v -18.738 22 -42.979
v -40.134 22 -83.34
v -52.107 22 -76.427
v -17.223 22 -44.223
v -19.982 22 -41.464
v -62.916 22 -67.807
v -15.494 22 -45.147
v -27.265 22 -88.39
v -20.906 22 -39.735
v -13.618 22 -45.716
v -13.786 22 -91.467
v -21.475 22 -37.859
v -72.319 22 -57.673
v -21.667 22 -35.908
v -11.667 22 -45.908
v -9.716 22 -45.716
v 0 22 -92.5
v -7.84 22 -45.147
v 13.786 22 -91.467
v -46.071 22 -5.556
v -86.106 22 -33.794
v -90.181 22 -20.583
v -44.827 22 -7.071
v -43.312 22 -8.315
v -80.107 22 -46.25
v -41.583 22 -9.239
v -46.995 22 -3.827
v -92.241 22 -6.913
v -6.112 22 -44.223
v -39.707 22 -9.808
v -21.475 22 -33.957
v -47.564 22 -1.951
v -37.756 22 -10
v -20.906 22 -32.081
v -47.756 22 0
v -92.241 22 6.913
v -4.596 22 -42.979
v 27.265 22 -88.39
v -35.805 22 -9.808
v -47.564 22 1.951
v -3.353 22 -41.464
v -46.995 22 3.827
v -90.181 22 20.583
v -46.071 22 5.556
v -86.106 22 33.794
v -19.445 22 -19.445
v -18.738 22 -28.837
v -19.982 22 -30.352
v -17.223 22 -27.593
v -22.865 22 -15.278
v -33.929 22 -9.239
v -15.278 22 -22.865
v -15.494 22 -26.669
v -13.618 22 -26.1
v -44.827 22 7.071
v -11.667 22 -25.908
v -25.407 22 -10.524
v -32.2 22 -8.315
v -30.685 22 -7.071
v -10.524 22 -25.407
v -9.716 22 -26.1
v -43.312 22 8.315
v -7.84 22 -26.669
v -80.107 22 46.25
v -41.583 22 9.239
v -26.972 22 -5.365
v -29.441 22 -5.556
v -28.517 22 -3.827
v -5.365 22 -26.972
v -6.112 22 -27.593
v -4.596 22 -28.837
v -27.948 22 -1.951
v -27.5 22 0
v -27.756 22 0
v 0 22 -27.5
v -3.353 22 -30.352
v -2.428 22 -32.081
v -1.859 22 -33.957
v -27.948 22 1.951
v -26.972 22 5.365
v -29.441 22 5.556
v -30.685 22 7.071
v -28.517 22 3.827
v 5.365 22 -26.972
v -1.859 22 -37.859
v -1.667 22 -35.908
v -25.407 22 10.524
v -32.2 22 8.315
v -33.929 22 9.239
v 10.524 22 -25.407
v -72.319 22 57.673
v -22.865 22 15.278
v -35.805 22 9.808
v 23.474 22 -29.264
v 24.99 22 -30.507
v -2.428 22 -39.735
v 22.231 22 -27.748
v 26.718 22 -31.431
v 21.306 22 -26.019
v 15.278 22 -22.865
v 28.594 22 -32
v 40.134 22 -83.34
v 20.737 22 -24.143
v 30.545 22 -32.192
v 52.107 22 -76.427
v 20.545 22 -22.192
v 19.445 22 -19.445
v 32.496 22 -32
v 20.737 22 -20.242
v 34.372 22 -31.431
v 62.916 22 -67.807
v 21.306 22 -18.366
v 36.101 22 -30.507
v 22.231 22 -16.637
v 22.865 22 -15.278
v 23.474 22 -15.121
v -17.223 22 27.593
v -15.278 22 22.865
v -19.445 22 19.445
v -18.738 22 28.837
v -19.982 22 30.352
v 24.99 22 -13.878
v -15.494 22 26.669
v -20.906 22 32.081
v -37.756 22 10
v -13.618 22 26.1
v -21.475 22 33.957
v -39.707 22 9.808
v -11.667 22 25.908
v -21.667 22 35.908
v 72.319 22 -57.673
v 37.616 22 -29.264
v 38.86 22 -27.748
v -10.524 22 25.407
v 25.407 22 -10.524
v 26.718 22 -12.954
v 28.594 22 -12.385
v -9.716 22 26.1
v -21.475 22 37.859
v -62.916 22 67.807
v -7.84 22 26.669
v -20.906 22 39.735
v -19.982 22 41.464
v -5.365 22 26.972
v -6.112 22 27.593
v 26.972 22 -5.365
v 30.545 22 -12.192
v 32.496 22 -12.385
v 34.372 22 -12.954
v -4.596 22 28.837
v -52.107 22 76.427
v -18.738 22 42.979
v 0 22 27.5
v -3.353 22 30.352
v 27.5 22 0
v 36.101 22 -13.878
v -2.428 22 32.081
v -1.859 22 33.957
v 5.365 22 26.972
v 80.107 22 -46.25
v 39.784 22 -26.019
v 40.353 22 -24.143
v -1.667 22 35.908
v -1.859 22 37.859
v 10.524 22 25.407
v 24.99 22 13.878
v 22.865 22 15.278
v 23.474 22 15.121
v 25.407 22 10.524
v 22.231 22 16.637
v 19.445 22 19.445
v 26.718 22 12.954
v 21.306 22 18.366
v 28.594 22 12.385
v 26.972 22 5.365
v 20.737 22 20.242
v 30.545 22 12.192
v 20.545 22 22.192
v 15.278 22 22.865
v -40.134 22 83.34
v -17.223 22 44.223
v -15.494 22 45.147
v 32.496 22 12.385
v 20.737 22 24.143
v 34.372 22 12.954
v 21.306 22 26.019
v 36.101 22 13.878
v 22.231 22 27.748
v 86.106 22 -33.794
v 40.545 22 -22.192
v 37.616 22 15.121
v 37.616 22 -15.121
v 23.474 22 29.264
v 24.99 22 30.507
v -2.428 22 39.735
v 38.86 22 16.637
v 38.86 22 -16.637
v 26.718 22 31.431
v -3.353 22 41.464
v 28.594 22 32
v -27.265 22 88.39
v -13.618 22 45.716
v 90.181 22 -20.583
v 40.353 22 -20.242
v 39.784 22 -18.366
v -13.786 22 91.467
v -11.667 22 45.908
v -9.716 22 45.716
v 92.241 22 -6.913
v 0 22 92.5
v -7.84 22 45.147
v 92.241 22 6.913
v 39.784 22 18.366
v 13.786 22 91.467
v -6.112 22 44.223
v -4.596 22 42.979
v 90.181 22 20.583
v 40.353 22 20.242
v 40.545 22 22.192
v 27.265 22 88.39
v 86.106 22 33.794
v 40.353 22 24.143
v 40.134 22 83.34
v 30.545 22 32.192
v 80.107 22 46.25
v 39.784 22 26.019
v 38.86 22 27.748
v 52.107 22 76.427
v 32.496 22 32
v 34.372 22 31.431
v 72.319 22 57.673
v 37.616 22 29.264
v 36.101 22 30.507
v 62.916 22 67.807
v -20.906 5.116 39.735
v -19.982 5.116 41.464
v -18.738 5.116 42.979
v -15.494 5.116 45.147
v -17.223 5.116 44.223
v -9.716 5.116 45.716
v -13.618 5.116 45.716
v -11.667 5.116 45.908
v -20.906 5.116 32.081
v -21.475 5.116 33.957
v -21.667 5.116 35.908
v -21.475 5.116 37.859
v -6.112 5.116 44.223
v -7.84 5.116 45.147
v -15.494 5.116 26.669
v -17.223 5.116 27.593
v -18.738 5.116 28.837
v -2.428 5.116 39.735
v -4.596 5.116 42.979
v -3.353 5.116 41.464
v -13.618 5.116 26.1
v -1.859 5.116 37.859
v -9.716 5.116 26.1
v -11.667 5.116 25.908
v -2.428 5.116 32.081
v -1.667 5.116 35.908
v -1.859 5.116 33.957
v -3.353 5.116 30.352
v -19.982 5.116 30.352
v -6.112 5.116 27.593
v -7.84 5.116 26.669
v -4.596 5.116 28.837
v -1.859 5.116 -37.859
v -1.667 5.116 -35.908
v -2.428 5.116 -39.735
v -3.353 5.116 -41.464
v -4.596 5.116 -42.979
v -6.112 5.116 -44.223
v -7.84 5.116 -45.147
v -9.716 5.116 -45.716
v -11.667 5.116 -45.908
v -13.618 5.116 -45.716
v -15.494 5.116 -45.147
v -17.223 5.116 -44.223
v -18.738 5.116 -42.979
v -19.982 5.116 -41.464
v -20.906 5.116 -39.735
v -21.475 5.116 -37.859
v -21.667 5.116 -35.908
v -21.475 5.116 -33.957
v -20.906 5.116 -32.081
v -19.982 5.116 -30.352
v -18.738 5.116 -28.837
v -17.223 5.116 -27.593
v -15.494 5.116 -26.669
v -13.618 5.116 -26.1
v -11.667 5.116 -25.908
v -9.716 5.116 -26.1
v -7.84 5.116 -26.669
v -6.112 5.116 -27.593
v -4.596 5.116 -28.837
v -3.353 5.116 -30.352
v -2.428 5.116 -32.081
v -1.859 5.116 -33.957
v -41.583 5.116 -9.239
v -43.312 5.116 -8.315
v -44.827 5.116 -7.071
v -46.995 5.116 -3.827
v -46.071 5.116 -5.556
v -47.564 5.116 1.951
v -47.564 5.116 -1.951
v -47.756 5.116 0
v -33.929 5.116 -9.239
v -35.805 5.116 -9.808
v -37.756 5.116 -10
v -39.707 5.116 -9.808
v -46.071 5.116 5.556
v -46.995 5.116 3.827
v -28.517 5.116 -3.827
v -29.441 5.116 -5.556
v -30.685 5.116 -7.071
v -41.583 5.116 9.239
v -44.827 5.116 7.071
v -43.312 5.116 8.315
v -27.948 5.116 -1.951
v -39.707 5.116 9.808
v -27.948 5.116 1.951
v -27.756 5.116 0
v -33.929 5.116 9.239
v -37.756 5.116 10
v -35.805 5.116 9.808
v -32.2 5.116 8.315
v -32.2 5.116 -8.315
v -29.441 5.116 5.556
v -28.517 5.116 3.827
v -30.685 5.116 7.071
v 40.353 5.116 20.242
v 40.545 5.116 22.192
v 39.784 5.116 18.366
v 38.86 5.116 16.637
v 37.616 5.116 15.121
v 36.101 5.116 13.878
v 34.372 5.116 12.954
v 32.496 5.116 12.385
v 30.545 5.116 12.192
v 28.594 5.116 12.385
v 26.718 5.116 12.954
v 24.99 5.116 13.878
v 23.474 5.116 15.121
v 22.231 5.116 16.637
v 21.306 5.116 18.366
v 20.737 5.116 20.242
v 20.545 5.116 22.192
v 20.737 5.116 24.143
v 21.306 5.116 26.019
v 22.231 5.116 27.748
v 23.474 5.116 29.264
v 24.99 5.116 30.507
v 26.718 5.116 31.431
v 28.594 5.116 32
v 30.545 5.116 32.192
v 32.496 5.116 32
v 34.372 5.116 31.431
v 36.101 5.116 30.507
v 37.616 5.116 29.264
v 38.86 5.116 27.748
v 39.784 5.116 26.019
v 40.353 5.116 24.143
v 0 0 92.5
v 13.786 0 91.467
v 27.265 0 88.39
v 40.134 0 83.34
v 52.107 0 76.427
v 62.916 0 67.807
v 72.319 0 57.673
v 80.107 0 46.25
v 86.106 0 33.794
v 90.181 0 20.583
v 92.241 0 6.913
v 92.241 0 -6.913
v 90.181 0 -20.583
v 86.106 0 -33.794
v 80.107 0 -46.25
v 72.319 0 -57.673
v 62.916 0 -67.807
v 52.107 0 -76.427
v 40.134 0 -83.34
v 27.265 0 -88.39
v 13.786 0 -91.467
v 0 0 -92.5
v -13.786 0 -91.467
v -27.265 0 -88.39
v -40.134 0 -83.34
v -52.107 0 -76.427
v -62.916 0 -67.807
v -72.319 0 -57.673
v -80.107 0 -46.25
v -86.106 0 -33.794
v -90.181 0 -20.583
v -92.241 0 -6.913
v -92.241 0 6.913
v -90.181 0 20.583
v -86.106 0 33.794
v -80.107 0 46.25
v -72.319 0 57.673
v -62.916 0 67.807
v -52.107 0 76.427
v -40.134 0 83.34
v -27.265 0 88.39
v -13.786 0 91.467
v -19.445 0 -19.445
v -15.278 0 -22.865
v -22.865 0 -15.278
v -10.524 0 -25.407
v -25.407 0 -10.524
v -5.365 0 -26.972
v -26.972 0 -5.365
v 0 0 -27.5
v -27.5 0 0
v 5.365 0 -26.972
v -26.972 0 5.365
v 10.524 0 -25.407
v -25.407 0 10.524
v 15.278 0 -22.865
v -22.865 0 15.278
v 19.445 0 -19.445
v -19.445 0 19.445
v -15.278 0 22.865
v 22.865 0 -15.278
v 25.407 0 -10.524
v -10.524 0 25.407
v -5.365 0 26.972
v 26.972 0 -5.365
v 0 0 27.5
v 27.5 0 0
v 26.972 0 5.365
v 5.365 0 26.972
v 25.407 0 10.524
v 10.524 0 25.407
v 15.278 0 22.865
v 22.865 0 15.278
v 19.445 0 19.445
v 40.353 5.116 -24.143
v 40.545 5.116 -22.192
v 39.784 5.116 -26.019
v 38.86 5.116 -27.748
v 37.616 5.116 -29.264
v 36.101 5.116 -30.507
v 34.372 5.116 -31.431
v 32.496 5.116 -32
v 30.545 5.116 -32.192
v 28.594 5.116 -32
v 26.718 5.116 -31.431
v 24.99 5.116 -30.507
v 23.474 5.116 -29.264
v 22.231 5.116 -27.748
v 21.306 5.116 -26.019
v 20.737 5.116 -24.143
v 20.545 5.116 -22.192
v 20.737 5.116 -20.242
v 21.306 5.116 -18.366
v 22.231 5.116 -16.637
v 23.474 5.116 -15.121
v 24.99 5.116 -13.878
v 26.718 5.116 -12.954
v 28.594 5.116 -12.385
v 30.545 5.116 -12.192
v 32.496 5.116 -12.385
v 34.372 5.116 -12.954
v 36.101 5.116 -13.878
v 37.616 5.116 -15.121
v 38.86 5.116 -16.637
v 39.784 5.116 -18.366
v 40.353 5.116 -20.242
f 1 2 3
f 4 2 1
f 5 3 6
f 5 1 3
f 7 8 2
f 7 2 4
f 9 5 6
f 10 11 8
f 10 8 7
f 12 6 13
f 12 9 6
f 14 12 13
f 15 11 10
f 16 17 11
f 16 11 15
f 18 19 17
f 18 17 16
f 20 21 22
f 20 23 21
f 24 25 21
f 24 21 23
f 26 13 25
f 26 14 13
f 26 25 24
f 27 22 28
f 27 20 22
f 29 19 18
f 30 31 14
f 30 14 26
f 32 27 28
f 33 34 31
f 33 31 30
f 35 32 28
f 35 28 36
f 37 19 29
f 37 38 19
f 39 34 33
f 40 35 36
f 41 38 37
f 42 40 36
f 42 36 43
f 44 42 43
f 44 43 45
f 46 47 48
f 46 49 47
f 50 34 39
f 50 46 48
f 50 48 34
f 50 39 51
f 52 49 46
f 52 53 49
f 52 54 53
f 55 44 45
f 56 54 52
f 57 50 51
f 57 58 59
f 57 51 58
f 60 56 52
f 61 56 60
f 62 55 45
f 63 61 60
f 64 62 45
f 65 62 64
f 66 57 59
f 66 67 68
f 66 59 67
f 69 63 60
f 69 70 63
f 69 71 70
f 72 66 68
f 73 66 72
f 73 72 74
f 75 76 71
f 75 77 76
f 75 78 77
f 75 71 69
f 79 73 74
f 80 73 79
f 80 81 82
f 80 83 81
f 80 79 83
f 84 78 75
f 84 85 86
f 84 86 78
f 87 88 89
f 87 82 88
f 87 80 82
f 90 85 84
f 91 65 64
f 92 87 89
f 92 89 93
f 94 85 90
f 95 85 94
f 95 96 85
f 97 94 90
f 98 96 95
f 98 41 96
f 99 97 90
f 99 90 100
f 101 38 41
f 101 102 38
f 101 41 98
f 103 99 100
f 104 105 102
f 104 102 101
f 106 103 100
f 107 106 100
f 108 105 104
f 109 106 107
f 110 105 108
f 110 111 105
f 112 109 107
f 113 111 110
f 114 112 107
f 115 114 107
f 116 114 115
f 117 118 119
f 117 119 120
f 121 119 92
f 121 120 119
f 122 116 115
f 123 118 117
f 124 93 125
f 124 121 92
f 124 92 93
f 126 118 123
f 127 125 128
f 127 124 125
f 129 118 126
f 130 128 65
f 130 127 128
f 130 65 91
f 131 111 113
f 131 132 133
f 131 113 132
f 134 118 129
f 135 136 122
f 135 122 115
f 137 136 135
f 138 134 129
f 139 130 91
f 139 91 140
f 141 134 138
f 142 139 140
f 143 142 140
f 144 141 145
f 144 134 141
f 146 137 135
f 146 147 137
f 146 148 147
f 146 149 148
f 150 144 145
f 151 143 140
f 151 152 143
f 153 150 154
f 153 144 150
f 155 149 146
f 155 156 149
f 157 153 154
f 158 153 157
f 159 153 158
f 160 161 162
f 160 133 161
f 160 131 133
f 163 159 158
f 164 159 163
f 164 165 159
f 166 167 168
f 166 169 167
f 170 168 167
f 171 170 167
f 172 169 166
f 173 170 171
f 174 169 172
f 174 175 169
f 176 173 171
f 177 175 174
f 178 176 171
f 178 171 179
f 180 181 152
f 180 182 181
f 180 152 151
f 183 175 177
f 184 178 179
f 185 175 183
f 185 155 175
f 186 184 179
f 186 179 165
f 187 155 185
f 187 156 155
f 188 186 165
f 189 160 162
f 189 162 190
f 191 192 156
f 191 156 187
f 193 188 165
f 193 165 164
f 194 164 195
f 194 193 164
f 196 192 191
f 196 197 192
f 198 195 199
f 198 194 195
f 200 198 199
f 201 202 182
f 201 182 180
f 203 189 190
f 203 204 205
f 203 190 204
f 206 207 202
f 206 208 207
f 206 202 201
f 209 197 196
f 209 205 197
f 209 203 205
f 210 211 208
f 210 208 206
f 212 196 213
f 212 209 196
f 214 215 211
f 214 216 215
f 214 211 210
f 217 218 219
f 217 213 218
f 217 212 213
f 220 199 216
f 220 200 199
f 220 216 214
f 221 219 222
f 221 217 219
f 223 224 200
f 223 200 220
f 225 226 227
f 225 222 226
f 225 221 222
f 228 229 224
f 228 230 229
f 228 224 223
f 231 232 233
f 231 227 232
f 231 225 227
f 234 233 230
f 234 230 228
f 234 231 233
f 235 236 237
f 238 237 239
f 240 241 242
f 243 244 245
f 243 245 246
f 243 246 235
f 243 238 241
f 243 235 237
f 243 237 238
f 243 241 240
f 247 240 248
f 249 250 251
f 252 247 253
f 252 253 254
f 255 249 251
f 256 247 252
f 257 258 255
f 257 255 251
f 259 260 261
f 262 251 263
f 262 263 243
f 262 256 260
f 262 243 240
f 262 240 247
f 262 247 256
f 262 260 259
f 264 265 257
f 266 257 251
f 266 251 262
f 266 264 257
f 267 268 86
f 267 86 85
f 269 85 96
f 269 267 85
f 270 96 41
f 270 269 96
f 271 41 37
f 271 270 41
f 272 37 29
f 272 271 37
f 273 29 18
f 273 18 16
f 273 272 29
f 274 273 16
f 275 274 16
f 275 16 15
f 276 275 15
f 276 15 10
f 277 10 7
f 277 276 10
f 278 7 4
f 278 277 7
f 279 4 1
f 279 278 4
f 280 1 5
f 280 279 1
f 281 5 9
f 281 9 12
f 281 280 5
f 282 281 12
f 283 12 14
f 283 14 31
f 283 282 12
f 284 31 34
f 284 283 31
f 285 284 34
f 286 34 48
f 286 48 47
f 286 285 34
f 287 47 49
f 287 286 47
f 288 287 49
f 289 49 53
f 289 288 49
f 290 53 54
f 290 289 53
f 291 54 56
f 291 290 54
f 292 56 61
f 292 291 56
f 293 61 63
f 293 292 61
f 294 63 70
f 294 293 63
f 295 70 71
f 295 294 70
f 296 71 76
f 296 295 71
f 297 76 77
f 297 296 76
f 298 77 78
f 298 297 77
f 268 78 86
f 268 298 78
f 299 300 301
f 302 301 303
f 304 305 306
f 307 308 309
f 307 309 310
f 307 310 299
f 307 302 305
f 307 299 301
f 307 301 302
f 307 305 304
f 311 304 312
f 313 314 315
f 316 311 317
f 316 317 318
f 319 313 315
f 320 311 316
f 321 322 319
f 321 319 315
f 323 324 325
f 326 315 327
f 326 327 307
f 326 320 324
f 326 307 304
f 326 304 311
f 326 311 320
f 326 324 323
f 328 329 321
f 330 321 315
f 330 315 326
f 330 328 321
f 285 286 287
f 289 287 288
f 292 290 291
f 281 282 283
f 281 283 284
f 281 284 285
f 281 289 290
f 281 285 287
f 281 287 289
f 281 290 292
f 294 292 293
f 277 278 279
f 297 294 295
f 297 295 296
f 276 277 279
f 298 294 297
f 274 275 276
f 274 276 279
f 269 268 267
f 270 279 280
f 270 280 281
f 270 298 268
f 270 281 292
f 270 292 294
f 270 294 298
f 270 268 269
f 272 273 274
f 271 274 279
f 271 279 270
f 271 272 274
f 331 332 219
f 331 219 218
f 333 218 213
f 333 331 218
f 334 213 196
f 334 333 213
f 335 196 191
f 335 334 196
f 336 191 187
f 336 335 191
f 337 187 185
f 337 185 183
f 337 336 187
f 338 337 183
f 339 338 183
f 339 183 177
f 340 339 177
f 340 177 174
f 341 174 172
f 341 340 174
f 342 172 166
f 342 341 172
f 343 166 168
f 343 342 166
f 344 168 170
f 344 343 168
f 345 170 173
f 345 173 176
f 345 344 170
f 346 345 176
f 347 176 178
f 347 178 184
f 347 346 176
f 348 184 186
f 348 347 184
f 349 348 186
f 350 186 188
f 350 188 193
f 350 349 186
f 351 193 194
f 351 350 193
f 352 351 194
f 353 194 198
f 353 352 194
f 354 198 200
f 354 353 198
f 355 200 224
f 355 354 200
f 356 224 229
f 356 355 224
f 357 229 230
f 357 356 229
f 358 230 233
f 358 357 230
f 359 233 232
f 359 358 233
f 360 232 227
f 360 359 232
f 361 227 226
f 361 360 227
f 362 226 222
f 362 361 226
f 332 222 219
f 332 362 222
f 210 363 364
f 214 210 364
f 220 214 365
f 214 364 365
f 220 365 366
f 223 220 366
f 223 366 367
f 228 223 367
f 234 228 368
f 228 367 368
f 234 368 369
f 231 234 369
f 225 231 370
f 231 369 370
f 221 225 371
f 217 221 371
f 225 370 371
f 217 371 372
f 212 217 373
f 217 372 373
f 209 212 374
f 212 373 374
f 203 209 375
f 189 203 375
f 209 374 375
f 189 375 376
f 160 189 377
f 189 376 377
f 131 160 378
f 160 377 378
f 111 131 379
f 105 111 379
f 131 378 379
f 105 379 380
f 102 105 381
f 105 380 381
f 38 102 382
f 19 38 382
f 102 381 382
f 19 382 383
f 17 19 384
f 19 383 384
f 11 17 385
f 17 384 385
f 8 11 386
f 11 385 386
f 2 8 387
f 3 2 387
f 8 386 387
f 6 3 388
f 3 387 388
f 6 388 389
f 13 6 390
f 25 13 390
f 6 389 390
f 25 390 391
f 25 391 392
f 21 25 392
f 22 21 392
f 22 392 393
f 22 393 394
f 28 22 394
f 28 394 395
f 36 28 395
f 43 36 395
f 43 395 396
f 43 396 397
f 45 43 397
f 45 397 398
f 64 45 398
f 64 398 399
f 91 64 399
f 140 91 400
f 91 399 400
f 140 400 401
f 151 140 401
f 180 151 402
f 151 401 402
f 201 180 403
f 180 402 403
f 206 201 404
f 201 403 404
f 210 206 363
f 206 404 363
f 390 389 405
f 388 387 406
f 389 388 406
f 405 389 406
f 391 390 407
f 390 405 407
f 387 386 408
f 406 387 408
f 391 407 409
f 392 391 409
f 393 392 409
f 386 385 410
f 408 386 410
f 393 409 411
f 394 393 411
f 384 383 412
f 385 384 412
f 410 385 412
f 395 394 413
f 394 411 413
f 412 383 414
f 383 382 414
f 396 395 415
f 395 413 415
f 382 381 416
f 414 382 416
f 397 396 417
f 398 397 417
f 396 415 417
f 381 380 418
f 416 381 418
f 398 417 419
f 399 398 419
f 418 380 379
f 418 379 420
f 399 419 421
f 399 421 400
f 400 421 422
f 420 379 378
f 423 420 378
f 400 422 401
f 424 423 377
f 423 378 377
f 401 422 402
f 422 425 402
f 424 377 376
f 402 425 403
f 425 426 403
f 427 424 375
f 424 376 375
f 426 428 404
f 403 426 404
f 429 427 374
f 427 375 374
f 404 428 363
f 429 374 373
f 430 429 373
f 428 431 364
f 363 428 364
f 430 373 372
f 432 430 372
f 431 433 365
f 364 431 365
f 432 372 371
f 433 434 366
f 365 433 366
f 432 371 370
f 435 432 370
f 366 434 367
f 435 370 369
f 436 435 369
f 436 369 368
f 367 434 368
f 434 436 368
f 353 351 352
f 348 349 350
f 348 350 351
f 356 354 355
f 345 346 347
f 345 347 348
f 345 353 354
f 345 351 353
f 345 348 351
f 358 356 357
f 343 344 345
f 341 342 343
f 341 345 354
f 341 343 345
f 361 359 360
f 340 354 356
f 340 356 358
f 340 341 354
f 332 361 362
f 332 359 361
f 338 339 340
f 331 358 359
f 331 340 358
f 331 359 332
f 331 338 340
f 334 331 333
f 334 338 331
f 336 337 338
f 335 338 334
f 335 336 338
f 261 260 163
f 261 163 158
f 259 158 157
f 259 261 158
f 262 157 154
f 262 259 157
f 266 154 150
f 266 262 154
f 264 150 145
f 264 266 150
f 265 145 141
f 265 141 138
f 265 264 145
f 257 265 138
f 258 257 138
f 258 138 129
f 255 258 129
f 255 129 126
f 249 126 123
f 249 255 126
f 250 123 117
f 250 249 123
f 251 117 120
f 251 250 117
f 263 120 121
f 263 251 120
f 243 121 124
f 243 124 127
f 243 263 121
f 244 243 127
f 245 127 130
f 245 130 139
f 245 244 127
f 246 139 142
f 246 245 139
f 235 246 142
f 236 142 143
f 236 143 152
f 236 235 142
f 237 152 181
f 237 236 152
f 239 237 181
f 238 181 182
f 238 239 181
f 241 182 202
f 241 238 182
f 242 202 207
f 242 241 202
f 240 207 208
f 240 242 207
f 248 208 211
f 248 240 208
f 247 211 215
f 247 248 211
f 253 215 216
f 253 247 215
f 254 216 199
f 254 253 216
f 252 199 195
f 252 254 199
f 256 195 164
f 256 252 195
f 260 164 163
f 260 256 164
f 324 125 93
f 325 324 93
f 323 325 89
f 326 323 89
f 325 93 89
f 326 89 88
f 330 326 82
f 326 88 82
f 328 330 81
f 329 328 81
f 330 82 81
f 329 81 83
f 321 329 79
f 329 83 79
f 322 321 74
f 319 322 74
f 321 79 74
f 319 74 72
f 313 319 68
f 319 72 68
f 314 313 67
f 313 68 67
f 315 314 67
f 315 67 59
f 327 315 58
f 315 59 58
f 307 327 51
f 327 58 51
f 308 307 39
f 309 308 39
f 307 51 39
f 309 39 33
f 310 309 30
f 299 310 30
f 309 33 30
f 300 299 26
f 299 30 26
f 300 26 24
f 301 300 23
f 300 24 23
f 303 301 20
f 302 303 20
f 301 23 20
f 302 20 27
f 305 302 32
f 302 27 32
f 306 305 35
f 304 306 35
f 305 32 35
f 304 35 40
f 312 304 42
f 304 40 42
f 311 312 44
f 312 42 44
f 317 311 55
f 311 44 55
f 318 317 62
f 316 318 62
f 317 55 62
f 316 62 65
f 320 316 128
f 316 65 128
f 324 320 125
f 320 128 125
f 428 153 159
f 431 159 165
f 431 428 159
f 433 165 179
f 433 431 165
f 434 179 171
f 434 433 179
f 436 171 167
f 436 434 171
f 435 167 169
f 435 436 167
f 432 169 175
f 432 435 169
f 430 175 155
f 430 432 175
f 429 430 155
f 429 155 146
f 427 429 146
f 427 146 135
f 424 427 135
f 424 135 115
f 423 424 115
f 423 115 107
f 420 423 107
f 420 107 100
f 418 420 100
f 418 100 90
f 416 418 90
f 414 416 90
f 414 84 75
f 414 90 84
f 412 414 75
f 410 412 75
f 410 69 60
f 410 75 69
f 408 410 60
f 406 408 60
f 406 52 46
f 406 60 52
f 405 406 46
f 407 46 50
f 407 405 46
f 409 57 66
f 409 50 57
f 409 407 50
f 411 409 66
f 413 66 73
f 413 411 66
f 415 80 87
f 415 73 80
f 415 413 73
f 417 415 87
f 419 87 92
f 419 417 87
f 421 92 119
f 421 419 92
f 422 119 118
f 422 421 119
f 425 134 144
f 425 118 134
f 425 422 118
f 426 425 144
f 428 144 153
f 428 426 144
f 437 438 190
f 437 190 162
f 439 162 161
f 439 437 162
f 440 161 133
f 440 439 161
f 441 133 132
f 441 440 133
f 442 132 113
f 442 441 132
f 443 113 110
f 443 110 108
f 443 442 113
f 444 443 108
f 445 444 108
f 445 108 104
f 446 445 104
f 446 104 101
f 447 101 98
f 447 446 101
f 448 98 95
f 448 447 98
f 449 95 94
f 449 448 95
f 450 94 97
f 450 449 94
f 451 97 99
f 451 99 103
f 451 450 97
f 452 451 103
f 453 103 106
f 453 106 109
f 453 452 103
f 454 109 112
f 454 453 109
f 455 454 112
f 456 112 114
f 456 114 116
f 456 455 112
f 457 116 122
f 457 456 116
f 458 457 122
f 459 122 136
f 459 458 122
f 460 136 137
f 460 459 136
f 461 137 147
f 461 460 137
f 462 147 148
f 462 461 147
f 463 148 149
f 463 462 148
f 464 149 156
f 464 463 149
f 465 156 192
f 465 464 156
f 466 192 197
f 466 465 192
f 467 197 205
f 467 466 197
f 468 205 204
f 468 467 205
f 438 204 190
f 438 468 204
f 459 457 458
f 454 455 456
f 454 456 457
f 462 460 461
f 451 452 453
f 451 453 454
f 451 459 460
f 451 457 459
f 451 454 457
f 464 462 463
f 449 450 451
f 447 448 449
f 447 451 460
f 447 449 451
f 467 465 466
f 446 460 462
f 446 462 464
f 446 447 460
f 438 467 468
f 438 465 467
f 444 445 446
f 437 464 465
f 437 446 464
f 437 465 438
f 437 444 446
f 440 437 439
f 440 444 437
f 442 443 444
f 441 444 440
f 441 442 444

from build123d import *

# Parameters (mm, degrees)
SKETCH1_R           = 92.5
BOSS_EXTRUDE1_DEPTH = 22
SKETCH2_R           = 27.5
CUT_EXTRUDE1_DEPTH  = 133.651799837
SKETCH3_R           = 10
CUT_EXTRUDE2_DEPTH  = 16.88371012
CIRPATTERN1_COUNT   = 5


with BuildPart() as part:
    # Sketch1 → Boss-Extrude1 (new body)
    with BuildSketch(Plane(origin=(0, 0, 0), x_dir=(1, 0, 0), z_dir=(0, 1, 0))):
        Circle(SKETCH1_R)
    extrude(amount=BOSS_EXTRUDE1_DEPTH)

    # Sketch2 → Cut-Extrude1 (cut, through all)
    with BuildSketch(Plane(origin=(0, 0, 0), x_dir=(1, 0, 0), z_dir=(0, 1, 0))):
        Circle(SKETCH2_R)
    extrude(amount=CUT_EXTRUDE1_DEPTH, mode=Mode.SUBTRACT)

    # Sketch3 → Cut-Extrude2 (cut)
    with BuildSketch(Plane(origin=(0, 22, 0), x_dir=(1, 0, 0), z_dir=(0, 1, 0))):
        with Locations((-37.756047361, 0)):
            Circle(SKETCH3_R)
    cut_extrude2 = extrude(amount=-CUT_EXTRUDE2_DEPTH, mode=Mode.SUBTRACT)

    # CirPattern1: Cut-Extrude2 ×5 about axis
    cirpattern1_axis = Axis((0, 0, 0), (0, 1, 0))
    for i in range(1, CIRPATTERN1_COUNT):
        add(cut_extrude2.rotate(cirpattern1_axis, i * 360 / CIRPATTERN1_COUNT), mode=Mode.SUBTRACT)


solid = part.part
